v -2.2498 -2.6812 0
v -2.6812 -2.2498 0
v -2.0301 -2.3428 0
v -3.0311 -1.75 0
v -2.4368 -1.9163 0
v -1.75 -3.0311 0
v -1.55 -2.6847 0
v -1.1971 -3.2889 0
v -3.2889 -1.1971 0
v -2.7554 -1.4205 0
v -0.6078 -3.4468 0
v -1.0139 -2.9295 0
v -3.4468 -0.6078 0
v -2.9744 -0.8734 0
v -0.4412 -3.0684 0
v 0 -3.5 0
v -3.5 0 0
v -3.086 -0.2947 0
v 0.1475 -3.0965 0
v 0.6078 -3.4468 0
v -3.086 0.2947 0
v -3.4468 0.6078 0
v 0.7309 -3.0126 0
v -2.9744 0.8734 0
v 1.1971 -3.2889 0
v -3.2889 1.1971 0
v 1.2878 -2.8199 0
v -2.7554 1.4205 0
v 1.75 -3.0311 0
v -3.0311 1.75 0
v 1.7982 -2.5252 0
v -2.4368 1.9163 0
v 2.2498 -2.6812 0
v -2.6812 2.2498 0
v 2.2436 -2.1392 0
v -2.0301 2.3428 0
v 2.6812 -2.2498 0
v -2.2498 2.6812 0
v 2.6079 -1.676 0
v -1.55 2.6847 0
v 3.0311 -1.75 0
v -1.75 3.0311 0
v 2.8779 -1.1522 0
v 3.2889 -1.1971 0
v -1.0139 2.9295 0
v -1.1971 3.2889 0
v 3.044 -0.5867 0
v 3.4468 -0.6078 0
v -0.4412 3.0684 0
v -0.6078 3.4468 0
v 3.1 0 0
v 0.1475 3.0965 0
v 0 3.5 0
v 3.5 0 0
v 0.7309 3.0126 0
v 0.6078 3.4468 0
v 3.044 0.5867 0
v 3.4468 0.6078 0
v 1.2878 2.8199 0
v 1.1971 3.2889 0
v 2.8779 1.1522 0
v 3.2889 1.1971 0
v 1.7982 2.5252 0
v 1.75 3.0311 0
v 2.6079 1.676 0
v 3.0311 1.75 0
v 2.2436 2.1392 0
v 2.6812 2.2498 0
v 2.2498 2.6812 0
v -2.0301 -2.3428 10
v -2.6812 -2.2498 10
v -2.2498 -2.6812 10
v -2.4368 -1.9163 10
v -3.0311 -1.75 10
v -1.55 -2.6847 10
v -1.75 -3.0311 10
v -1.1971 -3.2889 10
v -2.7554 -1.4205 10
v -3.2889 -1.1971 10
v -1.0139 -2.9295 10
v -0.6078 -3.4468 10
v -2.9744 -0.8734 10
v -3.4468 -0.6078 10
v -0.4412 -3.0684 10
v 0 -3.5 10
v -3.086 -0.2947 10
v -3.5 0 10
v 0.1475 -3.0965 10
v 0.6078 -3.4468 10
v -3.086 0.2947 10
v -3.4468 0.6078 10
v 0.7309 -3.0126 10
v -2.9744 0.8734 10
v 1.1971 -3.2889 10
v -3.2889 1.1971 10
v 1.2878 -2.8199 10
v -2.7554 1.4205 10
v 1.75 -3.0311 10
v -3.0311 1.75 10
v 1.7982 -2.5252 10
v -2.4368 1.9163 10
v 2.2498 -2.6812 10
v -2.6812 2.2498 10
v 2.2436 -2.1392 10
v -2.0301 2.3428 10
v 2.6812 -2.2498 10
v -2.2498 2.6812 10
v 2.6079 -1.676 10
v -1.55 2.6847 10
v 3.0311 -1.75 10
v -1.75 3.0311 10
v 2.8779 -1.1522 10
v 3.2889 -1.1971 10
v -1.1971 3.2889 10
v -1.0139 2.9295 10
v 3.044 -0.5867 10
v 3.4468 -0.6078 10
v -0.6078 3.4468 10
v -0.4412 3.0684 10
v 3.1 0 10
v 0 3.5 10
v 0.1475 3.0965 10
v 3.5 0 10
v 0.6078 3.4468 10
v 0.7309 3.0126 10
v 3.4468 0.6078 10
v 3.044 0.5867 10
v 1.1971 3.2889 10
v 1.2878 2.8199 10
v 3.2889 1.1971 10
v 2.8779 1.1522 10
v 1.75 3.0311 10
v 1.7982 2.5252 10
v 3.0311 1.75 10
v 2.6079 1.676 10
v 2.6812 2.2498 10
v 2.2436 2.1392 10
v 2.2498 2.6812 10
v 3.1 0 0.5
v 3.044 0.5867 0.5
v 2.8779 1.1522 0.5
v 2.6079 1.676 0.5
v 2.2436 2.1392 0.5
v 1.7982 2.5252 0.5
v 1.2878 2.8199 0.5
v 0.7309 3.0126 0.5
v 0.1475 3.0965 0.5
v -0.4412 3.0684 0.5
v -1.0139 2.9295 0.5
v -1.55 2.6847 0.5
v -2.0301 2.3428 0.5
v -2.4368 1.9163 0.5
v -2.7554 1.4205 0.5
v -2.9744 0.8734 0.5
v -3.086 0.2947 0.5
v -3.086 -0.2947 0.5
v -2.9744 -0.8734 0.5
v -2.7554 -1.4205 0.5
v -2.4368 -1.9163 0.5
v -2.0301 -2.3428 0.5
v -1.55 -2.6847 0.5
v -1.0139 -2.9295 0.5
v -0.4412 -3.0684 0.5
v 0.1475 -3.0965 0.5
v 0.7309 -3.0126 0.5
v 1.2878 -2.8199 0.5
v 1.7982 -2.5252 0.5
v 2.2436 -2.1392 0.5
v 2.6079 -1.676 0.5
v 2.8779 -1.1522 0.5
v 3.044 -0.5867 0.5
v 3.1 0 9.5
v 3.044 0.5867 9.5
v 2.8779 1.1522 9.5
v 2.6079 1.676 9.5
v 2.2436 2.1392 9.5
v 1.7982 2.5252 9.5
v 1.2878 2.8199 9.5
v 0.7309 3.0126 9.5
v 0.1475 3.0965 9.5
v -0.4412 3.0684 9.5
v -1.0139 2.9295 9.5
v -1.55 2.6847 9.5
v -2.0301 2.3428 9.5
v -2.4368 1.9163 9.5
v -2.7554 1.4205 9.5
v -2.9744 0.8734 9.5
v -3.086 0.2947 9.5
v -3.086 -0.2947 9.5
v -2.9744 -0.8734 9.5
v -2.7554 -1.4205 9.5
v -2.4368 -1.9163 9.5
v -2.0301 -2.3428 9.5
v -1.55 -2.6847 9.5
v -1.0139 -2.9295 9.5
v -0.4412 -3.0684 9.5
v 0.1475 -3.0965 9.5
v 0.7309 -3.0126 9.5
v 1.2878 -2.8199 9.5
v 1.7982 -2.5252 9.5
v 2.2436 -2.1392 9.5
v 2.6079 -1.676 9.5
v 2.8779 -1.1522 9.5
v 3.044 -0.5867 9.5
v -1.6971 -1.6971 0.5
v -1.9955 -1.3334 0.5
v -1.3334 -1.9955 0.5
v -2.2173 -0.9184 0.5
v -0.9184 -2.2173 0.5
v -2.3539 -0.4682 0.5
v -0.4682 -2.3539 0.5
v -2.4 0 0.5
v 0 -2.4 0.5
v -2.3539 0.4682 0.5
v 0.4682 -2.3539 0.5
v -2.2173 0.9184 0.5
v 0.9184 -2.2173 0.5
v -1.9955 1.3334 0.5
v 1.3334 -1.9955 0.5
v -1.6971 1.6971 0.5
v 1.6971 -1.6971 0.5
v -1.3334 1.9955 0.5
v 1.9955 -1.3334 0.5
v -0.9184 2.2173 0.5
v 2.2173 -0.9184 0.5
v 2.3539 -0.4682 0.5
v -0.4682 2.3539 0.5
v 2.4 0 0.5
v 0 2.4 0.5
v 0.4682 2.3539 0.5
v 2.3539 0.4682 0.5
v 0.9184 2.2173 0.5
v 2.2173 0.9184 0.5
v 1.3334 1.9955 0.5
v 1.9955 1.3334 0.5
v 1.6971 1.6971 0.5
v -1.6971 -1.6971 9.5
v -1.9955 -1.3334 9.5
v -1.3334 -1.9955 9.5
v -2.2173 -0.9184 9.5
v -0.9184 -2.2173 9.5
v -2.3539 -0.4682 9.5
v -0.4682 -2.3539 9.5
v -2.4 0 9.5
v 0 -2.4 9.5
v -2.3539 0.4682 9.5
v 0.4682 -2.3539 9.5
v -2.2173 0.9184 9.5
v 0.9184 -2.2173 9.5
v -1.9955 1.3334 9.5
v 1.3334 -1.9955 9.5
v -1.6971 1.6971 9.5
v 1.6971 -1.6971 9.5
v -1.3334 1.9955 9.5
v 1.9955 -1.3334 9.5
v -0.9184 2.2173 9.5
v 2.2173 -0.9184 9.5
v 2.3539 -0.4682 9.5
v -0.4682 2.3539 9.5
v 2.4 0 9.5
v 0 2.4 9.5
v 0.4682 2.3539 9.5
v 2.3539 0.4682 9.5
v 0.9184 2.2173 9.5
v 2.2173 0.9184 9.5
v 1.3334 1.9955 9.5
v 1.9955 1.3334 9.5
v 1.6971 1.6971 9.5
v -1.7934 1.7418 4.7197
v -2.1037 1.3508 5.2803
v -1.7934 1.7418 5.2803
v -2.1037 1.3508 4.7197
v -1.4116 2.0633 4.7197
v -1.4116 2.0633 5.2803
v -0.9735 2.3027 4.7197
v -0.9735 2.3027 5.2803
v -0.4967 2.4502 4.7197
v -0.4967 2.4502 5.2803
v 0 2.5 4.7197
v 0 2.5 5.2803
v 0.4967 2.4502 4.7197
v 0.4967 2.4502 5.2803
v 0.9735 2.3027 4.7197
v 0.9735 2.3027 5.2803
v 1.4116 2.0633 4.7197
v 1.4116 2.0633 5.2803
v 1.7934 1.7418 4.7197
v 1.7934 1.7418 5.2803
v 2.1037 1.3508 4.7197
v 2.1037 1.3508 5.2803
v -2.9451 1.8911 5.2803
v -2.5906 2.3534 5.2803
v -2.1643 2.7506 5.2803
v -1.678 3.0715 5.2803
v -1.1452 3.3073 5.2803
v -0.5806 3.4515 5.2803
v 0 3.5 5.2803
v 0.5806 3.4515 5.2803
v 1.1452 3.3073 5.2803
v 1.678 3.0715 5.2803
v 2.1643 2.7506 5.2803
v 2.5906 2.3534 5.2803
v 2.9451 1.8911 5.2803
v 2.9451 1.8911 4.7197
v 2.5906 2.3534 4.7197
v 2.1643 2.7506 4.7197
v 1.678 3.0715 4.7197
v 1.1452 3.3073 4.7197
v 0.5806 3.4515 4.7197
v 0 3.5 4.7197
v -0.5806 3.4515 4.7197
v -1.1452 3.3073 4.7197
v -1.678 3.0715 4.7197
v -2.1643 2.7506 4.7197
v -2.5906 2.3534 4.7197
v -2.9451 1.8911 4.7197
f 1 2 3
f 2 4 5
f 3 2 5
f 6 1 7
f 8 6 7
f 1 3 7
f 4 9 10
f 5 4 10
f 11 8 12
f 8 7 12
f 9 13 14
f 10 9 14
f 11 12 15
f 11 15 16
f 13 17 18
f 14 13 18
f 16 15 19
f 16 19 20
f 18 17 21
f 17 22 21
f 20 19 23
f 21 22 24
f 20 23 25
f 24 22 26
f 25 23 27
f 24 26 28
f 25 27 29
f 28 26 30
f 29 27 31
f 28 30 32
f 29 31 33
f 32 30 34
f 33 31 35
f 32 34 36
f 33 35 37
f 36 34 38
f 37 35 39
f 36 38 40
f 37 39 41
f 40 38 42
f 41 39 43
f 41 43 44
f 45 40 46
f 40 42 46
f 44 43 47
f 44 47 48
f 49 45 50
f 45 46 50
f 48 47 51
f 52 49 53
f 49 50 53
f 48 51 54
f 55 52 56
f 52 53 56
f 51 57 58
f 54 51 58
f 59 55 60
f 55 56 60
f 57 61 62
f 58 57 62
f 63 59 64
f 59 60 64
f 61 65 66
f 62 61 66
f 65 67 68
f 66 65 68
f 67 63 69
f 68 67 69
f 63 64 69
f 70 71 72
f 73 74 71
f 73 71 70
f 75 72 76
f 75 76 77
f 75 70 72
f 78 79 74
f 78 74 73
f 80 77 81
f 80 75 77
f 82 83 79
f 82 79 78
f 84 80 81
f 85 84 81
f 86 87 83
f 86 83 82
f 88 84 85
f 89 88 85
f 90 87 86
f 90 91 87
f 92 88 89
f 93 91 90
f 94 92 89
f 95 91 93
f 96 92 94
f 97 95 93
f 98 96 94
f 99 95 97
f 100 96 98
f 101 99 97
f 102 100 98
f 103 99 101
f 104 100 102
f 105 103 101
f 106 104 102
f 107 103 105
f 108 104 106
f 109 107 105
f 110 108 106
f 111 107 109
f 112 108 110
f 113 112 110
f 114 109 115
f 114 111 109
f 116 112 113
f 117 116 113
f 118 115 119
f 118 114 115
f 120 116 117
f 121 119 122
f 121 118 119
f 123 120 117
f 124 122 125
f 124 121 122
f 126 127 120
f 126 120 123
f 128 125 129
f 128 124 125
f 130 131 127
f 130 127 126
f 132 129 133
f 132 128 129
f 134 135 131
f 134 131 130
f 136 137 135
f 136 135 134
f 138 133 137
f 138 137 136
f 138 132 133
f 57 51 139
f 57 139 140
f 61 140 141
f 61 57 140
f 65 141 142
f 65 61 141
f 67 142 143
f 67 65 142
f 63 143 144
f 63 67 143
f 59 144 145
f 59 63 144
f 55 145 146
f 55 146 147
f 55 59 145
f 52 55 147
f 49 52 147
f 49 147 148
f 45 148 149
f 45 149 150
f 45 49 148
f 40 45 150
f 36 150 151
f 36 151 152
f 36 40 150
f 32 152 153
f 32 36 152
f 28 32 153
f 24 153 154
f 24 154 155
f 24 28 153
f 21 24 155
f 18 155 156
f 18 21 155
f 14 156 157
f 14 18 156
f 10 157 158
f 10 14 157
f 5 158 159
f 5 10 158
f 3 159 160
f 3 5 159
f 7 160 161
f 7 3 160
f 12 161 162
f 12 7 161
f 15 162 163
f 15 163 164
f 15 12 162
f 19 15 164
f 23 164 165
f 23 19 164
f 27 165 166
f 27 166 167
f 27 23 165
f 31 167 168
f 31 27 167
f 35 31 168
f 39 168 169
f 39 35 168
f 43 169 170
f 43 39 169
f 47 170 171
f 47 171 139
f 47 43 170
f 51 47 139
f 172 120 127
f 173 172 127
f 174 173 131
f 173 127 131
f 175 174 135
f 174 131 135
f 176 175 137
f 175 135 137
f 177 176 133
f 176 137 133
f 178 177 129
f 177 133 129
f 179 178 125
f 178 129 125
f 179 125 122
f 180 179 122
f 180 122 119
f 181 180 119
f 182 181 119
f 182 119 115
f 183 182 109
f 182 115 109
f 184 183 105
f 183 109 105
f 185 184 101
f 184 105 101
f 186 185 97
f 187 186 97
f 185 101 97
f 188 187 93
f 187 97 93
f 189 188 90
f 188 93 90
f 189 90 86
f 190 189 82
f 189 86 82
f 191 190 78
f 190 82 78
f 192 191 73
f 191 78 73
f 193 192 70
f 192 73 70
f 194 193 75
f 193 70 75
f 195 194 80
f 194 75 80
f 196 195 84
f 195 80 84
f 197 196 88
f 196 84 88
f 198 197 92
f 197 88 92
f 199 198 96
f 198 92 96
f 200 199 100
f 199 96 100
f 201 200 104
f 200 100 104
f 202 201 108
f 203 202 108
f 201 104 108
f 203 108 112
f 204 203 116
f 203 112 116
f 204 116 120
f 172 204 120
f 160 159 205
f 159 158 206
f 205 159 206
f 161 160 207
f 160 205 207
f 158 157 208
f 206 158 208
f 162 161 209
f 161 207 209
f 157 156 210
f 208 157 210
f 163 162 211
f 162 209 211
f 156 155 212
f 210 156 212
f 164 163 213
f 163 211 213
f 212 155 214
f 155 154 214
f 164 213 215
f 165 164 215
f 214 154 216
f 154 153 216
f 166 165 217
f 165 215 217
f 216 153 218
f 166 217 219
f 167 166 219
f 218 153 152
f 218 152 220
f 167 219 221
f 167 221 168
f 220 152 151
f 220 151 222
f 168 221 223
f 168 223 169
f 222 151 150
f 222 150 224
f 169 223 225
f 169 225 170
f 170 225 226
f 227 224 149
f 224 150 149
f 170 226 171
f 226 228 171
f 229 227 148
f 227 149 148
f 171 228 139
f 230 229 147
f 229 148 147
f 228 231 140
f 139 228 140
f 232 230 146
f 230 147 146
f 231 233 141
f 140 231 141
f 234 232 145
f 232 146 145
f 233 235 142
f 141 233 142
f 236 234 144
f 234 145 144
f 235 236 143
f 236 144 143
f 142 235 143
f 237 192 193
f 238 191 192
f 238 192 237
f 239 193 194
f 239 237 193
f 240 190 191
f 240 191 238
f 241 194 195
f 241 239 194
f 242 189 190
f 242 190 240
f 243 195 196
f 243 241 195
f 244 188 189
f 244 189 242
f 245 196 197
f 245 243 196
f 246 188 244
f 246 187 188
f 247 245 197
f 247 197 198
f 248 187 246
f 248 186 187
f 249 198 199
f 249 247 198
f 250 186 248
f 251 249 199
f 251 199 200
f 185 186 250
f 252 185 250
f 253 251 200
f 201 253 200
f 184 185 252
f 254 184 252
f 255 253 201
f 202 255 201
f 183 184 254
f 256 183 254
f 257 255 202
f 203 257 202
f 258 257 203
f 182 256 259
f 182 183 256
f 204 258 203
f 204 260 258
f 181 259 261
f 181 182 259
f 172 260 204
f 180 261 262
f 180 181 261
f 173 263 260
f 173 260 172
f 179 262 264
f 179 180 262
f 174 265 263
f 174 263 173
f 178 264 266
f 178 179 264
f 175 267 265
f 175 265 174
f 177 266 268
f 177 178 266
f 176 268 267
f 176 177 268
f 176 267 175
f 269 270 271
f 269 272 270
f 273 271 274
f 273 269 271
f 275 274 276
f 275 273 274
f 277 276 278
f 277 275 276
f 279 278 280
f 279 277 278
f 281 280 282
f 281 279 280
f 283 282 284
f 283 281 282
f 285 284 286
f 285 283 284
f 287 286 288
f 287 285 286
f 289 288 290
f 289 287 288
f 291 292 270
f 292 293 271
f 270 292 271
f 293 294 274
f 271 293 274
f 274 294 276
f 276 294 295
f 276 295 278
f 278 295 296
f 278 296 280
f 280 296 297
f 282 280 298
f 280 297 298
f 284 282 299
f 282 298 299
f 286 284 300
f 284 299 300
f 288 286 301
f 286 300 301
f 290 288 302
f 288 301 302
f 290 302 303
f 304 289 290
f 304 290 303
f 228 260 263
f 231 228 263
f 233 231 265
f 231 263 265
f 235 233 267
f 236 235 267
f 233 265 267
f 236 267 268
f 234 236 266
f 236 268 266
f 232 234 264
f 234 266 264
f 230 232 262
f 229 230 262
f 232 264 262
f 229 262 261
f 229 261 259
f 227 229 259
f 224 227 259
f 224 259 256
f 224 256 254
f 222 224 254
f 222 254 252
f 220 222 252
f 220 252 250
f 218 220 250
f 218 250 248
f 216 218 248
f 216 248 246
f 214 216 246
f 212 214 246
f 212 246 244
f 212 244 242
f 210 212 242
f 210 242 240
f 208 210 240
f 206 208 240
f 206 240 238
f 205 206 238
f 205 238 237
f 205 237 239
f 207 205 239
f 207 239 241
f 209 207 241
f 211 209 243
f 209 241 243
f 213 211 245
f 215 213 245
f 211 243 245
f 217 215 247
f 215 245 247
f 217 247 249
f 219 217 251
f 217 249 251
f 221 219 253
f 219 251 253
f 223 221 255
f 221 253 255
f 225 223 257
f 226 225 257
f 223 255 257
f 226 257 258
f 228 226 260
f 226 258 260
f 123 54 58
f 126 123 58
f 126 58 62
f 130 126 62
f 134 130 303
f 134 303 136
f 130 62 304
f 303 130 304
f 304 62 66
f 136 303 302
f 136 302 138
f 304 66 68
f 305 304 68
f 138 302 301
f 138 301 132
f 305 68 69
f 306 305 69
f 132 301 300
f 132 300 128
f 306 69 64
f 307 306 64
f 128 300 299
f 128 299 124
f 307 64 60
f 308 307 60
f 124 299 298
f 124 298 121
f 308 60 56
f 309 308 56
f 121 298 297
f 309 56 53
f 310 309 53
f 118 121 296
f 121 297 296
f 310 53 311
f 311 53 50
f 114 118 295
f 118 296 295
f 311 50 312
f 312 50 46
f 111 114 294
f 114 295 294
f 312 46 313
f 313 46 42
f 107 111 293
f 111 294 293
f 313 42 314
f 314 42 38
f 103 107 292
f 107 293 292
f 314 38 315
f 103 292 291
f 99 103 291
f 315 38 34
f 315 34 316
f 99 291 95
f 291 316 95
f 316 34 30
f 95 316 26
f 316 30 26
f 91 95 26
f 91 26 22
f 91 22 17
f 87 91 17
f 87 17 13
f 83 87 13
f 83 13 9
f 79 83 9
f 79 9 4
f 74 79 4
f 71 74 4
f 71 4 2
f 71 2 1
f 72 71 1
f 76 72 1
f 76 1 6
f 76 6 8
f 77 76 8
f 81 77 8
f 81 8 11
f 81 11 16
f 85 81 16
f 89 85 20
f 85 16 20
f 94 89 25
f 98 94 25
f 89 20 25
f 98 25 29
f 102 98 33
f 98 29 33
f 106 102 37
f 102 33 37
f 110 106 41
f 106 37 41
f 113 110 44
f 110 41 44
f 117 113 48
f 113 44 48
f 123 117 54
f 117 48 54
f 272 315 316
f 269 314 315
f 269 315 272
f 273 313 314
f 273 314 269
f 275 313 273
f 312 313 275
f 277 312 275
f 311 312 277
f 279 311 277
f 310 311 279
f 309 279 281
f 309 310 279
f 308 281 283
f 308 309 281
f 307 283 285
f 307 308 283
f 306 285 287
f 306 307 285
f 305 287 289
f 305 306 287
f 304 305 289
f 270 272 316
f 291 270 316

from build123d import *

# Parameters (mm, degrees)
SKETCH1_R           = 3.5
BOSS_EXTRUDE1_DEPTH = 10
SKETCH3_R           = 2.4
CUT_EXTRUDE1_DEPTH  = 12.157956802
SKETCH4_R           = 3.1
CUT_EXTRUDE2_DEPTH  = 0.5
WRAP1_SECTION_W     = 1
WRAP1_SECTION_H     = 0.5606788
WRAP1_ANGLE         = 114.591559026


with BuildPart() as part:
    # Sketch1 → Boss-Extrude1 (new body)
    with BuildSketch(Plane.XY):
        Circle(SKETCH1_R)
    extrude(amount=BOSS_EXTRUDE1_DEPTH)

    # Sketch3 → Cut-Extrude1 (cut, through all)
    with BuildSketch(Plane.XY.offset(10)):
        Circle(SKETCH3_R)
    extrude(amount=-CUT_EXTRUDE1_DEPTH, mode=Mode.SUBTRACT)

    # Sketch4 → Cut-Extrude2 (cut)
    with BuildSketch(Plane.XY.offset(10)):
        Circle(SKETCH4_R)
    cut_extrude2 = extrude(amount=-CUT_EXTRUDE2_DEPTH, mode=Mode.SUBTRACT)

    # Mirror1: Cut-Extrude2 across plane
    add(cut_extrude2.mirror(Plane.XY.offset(5)), mode=Mode.SUBTRACT)

    # Wrap1 section (on wrap section) → Wrap1 (revolve, cut)
    with BuildSketch(Plane(origin=(0, 0, 0), x_dir=(-0.8414709848078967, 0.5403023058681393, 0), z_dir=(-0.5403023058681393, -0.8414709848078967, 0))):
        with Locations((3, -5)):
            Rectangle(WRAP1_SECTION_W, WRAP1_SECTION_H)
    revolve(axis=Axis((0, 0, 0), (0, 0, -1)), revolution_arc=WRAP1_ANGLE, mode=Mode.SUBTRACT)


solid = part.part
